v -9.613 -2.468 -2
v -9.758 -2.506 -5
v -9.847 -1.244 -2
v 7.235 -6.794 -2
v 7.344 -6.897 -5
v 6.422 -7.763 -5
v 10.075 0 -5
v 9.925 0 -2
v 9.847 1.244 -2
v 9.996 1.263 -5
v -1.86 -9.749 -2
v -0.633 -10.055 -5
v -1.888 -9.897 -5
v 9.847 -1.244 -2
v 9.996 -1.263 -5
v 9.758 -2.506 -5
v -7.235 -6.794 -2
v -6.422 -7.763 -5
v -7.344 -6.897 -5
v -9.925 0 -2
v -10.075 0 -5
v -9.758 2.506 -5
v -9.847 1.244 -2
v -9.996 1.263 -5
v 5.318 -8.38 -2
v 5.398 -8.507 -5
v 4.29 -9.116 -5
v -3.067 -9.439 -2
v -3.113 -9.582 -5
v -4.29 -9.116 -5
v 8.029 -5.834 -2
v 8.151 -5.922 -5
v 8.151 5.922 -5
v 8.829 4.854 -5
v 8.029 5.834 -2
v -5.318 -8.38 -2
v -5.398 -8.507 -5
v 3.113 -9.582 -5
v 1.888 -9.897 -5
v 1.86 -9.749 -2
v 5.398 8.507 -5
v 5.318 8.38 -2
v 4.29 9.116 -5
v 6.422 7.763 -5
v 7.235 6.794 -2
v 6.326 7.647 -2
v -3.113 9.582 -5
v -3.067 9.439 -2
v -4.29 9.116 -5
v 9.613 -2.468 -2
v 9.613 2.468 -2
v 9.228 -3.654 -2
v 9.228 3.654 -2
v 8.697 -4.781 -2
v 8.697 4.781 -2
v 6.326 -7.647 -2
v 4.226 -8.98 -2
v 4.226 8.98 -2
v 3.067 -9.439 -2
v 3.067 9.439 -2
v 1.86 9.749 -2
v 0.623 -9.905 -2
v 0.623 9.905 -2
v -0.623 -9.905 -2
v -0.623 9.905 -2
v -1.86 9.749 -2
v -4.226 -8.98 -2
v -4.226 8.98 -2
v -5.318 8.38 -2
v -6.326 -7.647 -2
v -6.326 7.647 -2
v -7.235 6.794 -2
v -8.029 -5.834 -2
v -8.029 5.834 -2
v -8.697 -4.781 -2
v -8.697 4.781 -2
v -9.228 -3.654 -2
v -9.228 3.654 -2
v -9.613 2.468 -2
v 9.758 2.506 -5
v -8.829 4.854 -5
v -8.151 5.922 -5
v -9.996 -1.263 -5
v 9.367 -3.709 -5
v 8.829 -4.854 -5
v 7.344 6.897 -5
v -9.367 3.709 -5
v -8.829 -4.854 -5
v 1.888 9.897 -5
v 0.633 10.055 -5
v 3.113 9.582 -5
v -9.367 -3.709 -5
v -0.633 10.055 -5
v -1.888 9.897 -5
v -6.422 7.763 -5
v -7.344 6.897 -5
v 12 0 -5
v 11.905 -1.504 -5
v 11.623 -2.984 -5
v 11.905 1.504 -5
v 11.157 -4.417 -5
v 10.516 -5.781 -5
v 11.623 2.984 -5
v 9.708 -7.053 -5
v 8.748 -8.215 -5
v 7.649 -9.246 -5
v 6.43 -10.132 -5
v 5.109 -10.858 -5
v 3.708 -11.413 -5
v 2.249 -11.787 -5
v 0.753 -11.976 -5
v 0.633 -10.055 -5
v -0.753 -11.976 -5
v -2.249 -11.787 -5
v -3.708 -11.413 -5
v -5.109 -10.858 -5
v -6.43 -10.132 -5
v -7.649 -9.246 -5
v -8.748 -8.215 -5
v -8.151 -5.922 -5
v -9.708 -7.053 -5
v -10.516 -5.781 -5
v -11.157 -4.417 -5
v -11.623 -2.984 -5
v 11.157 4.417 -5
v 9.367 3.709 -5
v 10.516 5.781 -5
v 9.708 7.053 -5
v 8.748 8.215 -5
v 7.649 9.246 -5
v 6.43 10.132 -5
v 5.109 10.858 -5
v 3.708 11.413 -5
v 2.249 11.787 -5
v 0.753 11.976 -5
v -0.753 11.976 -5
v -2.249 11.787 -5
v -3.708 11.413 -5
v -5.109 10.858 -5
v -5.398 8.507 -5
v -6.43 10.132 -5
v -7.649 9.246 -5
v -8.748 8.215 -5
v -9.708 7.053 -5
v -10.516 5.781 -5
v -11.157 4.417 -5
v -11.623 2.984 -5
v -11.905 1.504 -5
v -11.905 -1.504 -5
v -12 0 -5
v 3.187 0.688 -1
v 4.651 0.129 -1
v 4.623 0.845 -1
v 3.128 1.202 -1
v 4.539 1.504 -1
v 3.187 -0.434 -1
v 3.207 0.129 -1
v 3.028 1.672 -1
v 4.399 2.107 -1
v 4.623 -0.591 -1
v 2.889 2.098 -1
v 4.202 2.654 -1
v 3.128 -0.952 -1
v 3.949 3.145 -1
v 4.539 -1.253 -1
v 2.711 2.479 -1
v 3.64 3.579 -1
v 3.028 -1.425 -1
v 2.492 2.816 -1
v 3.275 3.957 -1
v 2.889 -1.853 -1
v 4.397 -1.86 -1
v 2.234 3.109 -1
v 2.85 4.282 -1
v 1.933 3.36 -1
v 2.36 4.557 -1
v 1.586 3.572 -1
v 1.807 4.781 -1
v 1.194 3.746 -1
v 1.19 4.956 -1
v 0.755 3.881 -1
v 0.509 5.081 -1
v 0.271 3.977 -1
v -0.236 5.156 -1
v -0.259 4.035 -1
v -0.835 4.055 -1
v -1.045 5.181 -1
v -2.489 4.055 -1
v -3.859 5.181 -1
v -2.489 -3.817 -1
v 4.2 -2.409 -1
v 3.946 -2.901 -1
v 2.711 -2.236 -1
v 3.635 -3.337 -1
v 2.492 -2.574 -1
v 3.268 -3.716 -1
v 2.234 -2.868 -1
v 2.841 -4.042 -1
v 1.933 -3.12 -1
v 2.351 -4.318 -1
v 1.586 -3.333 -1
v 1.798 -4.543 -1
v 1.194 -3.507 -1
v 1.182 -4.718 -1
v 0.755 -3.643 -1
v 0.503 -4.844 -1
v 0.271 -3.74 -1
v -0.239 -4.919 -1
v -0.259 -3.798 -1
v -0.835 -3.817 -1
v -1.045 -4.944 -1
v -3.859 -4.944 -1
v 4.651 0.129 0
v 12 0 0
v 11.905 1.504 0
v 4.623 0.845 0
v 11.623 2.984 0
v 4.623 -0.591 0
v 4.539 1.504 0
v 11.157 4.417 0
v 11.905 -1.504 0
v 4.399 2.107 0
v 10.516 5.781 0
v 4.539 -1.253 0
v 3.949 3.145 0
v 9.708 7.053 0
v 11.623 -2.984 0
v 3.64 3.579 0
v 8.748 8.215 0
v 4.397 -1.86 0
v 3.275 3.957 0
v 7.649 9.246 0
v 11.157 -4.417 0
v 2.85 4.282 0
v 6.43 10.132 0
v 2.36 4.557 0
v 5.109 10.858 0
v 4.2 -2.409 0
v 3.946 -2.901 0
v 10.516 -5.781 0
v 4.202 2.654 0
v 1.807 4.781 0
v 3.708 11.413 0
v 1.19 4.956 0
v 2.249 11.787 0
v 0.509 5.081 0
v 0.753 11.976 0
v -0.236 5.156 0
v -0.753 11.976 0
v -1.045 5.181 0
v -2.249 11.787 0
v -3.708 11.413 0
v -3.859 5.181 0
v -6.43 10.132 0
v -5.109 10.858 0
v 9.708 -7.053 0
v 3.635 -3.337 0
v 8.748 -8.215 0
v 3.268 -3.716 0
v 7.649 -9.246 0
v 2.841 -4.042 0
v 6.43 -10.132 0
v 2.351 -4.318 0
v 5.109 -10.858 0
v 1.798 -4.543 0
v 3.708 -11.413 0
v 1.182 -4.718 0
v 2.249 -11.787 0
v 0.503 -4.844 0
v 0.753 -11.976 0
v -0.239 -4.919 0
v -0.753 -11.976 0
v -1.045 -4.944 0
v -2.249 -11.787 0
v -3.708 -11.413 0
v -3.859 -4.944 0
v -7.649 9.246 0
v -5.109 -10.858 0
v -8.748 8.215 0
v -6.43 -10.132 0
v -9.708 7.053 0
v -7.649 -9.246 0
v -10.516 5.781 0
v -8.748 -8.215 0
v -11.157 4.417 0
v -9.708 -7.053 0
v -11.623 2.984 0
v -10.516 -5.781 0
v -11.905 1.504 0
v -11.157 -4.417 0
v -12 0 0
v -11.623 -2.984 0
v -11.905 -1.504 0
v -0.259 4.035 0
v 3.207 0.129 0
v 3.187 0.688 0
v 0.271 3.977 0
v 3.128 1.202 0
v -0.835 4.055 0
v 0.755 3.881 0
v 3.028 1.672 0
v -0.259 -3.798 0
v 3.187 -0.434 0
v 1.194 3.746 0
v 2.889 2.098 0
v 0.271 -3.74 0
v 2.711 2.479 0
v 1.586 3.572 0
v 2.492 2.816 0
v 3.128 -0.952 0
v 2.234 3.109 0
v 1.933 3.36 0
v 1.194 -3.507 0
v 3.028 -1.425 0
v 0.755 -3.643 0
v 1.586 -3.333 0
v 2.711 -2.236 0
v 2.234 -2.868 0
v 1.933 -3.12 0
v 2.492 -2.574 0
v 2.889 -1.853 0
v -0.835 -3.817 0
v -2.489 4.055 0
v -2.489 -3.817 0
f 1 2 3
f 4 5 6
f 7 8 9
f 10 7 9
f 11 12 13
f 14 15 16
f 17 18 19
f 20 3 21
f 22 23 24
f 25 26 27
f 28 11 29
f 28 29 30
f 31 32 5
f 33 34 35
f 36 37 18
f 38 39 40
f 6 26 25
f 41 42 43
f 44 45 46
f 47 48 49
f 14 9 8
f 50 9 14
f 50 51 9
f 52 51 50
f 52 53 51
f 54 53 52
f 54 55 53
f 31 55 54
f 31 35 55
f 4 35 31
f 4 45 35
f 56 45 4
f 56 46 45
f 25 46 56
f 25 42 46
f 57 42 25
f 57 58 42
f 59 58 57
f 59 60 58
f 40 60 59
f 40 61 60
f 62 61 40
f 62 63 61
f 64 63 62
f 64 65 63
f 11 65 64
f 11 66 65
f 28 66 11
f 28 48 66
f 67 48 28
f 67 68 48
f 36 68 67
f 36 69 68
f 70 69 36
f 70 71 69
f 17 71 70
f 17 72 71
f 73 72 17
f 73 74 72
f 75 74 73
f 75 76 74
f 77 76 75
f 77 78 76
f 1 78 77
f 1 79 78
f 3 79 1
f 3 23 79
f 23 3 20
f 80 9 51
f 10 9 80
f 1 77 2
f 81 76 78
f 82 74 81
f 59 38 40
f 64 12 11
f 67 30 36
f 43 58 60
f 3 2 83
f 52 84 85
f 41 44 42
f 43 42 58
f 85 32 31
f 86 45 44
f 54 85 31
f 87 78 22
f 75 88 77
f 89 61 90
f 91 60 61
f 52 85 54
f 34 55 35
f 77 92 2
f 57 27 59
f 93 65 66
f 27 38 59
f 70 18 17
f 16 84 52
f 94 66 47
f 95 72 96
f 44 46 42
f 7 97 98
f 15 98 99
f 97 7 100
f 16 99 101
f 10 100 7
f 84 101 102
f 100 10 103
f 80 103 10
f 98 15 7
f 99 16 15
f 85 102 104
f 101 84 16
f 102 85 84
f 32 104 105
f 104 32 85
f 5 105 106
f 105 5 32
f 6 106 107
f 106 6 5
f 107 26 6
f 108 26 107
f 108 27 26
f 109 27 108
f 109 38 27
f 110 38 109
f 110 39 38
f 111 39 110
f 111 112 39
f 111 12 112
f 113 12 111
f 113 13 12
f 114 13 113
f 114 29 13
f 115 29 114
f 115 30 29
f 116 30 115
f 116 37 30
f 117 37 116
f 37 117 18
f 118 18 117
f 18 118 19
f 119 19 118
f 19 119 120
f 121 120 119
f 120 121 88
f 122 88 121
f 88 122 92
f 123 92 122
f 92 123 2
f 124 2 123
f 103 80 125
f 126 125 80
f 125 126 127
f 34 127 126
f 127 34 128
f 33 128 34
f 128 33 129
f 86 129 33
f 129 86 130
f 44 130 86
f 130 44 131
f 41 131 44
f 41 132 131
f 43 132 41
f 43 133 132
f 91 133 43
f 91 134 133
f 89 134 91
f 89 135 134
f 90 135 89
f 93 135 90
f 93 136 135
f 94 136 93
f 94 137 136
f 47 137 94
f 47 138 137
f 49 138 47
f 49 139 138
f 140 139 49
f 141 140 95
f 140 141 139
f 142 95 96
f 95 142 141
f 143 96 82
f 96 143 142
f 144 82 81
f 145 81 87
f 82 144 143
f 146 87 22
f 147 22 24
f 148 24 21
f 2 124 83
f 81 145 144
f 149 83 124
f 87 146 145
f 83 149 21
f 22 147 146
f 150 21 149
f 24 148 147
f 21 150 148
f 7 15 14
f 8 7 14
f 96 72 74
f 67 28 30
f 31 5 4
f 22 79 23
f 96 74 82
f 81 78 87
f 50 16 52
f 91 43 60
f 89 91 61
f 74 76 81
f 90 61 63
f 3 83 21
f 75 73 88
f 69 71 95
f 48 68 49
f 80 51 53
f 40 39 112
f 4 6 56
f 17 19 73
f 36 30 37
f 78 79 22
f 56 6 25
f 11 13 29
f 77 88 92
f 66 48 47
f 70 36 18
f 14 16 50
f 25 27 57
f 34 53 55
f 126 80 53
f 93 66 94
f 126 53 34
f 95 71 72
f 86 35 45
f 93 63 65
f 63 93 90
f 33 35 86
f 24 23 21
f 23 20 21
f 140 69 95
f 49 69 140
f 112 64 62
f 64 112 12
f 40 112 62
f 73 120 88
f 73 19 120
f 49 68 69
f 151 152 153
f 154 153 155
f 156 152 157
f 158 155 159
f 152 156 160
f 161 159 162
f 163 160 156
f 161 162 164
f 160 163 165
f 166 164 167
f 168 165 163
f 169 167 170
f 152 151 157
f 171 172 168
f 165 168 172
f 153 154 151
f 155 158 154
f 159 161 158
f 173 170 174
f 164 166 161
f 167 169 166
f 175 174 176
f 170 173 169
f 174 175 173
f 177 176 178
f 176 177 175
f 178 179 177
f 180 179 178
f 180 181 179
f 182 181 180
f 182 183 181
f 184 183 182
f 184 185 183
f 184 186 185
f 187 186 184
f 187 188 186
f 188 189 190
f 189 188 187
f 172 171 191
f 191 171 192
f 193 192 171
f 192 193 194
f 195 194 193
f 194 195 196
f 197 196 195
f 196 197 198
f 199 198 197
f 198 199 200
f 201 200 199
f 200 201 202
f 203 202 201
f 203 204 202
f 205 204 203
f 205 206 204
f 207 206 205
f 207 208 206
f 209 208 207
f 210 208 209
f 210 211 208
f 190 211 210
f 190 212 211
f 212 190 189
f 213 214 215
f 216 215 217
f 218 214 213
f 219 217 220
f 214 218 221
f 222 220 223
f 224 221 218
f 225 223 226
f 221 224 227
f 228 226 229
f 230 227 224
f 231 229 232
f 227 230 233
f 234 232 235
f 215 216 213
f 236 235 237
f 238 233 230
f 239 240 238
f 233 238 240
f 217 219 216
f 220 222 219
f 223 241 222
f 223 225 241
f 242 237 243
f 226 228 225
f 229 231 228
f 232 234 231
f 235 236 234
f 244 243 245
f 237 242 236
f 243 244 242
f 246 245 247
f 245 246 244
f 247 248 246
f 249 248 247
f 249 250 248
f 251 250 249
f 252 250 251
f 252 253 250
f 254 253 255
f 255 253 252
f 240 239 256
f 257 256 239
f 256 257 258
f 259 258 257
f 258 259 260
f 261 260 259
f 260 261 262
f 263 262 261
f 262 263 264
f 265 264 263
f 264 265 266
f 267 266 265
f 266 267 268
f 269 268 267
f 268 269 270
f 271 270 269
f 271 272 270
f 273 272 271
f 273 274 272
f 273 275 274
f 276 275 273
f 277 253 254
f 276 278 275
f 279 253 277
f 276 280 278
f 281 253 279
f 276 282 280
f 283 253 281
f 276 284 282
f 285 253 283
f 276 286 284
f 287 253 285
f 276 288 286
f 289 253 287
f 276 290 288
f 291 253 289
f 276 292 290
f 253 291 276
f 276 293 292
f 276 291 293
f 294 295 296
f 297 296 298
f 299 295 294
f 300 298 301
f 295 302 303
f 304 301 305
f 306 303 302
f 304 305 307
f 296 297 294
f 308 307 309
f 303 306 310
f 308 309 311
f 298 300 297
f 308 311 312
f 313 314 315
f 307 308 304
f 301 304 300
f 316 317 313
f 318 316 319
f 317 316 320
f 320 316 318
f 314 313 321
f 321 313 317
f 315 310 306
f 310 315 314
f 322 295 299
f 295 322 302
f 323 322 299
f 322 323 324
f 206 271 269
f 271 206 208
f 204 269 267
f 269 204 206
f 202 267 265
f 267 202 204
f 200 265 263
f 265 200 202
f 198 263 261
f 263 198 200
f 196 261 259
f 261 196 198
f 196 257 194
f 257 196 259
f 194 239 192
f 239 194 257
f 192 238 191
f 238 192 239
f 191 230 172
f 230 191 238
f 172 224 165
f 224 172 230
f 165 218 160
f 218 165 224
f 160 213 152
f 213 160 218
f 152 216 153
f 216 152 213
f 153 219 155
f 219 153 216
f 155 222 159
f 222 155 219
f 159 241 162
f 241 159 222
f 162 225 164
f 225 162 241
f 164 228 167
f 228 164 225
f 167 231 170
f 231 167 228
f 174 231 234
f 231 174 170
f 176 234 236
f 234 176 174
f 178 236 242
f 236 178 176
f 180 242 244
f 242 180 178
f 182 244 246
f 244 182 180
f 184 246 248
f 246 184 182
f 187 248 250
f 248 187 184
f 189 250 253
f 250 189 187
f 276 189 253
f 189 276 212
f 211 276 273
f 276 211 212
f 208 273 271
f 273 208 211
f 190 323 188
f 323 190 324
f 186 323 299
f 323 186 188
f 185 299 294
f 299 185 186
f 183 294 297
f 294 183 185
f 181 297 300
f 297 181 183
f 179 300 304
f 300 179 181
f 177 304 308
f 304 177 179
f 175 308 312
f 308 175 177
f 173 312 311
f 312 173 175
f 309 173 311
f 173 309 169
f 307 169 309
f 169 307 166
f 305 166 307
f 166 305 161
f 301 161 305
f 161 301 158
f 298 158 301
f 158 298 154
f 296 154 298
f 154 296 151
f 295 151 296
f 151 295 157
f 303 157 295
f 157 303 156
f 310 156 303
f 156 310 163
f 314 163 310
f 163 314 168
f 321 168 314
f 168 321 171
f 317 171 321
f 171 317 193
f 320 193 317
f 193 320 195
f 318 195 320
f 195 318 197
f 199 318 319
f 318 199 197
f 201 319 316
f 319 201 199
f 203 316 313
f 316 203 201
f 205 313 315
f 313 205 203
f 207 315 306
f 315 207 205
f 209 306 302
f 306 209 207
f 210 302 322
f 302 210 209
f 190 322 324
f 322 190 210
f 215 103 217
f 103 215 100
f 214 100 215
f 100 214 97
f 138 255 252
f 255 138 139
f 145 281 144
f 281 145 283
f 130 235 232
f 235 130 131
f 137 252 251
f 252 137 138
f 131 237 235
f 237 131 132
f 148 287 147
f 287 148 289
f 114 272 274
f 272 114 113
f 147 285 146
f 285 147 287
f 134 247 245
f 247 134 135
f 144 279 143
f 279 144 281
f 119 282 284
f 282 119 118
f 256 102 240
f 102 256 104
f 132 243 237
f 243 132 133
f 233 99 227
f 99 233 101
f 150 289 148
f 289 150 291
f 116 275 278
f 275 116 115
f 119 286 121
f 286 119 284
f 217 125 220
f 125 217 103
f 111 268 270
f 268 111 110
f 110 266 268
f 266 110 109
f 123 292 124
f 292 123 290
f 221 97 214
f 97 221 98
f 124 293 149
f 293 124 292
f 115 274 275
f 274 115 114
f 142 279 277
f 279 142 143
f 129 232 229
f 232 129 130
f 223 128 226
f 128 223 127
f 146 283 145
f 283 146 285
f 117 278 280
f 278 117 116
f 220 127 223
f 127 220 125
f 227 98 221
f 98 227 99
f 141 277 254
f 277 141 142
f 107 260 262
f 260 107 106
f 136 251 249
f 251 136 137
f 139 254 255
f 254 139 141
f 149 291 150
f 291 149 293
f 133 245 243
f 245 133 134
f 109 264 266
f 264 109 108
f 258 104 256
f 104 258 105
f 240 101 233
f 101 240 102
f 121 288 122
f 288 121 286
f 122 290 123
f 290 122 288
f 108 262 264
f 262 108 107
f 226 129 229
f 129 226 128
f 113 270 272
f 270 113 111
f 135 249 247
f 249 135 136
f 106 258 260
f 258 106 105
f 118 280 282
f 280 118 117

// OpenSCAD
$fn = 50;


difference() {
	union() {
		translate(v = [0, 0, -5.0000000000]) {
			cylinder(h = 5, r = 12.0000000000);
		}
	}
	union() {
		#translate(v = [0, 0, -5.0000000000]) {
			cylinder(h = 3, r1 = 10.0750000000, r2 = 9.9250000000);
		}
		translate(v = [0, 0, -1]) {
			linear_extrude(height = 1) {
				text(font = "Impact", halign = "center", size = 10, text = "D", valign = "center");
			}
		}
	}
}
